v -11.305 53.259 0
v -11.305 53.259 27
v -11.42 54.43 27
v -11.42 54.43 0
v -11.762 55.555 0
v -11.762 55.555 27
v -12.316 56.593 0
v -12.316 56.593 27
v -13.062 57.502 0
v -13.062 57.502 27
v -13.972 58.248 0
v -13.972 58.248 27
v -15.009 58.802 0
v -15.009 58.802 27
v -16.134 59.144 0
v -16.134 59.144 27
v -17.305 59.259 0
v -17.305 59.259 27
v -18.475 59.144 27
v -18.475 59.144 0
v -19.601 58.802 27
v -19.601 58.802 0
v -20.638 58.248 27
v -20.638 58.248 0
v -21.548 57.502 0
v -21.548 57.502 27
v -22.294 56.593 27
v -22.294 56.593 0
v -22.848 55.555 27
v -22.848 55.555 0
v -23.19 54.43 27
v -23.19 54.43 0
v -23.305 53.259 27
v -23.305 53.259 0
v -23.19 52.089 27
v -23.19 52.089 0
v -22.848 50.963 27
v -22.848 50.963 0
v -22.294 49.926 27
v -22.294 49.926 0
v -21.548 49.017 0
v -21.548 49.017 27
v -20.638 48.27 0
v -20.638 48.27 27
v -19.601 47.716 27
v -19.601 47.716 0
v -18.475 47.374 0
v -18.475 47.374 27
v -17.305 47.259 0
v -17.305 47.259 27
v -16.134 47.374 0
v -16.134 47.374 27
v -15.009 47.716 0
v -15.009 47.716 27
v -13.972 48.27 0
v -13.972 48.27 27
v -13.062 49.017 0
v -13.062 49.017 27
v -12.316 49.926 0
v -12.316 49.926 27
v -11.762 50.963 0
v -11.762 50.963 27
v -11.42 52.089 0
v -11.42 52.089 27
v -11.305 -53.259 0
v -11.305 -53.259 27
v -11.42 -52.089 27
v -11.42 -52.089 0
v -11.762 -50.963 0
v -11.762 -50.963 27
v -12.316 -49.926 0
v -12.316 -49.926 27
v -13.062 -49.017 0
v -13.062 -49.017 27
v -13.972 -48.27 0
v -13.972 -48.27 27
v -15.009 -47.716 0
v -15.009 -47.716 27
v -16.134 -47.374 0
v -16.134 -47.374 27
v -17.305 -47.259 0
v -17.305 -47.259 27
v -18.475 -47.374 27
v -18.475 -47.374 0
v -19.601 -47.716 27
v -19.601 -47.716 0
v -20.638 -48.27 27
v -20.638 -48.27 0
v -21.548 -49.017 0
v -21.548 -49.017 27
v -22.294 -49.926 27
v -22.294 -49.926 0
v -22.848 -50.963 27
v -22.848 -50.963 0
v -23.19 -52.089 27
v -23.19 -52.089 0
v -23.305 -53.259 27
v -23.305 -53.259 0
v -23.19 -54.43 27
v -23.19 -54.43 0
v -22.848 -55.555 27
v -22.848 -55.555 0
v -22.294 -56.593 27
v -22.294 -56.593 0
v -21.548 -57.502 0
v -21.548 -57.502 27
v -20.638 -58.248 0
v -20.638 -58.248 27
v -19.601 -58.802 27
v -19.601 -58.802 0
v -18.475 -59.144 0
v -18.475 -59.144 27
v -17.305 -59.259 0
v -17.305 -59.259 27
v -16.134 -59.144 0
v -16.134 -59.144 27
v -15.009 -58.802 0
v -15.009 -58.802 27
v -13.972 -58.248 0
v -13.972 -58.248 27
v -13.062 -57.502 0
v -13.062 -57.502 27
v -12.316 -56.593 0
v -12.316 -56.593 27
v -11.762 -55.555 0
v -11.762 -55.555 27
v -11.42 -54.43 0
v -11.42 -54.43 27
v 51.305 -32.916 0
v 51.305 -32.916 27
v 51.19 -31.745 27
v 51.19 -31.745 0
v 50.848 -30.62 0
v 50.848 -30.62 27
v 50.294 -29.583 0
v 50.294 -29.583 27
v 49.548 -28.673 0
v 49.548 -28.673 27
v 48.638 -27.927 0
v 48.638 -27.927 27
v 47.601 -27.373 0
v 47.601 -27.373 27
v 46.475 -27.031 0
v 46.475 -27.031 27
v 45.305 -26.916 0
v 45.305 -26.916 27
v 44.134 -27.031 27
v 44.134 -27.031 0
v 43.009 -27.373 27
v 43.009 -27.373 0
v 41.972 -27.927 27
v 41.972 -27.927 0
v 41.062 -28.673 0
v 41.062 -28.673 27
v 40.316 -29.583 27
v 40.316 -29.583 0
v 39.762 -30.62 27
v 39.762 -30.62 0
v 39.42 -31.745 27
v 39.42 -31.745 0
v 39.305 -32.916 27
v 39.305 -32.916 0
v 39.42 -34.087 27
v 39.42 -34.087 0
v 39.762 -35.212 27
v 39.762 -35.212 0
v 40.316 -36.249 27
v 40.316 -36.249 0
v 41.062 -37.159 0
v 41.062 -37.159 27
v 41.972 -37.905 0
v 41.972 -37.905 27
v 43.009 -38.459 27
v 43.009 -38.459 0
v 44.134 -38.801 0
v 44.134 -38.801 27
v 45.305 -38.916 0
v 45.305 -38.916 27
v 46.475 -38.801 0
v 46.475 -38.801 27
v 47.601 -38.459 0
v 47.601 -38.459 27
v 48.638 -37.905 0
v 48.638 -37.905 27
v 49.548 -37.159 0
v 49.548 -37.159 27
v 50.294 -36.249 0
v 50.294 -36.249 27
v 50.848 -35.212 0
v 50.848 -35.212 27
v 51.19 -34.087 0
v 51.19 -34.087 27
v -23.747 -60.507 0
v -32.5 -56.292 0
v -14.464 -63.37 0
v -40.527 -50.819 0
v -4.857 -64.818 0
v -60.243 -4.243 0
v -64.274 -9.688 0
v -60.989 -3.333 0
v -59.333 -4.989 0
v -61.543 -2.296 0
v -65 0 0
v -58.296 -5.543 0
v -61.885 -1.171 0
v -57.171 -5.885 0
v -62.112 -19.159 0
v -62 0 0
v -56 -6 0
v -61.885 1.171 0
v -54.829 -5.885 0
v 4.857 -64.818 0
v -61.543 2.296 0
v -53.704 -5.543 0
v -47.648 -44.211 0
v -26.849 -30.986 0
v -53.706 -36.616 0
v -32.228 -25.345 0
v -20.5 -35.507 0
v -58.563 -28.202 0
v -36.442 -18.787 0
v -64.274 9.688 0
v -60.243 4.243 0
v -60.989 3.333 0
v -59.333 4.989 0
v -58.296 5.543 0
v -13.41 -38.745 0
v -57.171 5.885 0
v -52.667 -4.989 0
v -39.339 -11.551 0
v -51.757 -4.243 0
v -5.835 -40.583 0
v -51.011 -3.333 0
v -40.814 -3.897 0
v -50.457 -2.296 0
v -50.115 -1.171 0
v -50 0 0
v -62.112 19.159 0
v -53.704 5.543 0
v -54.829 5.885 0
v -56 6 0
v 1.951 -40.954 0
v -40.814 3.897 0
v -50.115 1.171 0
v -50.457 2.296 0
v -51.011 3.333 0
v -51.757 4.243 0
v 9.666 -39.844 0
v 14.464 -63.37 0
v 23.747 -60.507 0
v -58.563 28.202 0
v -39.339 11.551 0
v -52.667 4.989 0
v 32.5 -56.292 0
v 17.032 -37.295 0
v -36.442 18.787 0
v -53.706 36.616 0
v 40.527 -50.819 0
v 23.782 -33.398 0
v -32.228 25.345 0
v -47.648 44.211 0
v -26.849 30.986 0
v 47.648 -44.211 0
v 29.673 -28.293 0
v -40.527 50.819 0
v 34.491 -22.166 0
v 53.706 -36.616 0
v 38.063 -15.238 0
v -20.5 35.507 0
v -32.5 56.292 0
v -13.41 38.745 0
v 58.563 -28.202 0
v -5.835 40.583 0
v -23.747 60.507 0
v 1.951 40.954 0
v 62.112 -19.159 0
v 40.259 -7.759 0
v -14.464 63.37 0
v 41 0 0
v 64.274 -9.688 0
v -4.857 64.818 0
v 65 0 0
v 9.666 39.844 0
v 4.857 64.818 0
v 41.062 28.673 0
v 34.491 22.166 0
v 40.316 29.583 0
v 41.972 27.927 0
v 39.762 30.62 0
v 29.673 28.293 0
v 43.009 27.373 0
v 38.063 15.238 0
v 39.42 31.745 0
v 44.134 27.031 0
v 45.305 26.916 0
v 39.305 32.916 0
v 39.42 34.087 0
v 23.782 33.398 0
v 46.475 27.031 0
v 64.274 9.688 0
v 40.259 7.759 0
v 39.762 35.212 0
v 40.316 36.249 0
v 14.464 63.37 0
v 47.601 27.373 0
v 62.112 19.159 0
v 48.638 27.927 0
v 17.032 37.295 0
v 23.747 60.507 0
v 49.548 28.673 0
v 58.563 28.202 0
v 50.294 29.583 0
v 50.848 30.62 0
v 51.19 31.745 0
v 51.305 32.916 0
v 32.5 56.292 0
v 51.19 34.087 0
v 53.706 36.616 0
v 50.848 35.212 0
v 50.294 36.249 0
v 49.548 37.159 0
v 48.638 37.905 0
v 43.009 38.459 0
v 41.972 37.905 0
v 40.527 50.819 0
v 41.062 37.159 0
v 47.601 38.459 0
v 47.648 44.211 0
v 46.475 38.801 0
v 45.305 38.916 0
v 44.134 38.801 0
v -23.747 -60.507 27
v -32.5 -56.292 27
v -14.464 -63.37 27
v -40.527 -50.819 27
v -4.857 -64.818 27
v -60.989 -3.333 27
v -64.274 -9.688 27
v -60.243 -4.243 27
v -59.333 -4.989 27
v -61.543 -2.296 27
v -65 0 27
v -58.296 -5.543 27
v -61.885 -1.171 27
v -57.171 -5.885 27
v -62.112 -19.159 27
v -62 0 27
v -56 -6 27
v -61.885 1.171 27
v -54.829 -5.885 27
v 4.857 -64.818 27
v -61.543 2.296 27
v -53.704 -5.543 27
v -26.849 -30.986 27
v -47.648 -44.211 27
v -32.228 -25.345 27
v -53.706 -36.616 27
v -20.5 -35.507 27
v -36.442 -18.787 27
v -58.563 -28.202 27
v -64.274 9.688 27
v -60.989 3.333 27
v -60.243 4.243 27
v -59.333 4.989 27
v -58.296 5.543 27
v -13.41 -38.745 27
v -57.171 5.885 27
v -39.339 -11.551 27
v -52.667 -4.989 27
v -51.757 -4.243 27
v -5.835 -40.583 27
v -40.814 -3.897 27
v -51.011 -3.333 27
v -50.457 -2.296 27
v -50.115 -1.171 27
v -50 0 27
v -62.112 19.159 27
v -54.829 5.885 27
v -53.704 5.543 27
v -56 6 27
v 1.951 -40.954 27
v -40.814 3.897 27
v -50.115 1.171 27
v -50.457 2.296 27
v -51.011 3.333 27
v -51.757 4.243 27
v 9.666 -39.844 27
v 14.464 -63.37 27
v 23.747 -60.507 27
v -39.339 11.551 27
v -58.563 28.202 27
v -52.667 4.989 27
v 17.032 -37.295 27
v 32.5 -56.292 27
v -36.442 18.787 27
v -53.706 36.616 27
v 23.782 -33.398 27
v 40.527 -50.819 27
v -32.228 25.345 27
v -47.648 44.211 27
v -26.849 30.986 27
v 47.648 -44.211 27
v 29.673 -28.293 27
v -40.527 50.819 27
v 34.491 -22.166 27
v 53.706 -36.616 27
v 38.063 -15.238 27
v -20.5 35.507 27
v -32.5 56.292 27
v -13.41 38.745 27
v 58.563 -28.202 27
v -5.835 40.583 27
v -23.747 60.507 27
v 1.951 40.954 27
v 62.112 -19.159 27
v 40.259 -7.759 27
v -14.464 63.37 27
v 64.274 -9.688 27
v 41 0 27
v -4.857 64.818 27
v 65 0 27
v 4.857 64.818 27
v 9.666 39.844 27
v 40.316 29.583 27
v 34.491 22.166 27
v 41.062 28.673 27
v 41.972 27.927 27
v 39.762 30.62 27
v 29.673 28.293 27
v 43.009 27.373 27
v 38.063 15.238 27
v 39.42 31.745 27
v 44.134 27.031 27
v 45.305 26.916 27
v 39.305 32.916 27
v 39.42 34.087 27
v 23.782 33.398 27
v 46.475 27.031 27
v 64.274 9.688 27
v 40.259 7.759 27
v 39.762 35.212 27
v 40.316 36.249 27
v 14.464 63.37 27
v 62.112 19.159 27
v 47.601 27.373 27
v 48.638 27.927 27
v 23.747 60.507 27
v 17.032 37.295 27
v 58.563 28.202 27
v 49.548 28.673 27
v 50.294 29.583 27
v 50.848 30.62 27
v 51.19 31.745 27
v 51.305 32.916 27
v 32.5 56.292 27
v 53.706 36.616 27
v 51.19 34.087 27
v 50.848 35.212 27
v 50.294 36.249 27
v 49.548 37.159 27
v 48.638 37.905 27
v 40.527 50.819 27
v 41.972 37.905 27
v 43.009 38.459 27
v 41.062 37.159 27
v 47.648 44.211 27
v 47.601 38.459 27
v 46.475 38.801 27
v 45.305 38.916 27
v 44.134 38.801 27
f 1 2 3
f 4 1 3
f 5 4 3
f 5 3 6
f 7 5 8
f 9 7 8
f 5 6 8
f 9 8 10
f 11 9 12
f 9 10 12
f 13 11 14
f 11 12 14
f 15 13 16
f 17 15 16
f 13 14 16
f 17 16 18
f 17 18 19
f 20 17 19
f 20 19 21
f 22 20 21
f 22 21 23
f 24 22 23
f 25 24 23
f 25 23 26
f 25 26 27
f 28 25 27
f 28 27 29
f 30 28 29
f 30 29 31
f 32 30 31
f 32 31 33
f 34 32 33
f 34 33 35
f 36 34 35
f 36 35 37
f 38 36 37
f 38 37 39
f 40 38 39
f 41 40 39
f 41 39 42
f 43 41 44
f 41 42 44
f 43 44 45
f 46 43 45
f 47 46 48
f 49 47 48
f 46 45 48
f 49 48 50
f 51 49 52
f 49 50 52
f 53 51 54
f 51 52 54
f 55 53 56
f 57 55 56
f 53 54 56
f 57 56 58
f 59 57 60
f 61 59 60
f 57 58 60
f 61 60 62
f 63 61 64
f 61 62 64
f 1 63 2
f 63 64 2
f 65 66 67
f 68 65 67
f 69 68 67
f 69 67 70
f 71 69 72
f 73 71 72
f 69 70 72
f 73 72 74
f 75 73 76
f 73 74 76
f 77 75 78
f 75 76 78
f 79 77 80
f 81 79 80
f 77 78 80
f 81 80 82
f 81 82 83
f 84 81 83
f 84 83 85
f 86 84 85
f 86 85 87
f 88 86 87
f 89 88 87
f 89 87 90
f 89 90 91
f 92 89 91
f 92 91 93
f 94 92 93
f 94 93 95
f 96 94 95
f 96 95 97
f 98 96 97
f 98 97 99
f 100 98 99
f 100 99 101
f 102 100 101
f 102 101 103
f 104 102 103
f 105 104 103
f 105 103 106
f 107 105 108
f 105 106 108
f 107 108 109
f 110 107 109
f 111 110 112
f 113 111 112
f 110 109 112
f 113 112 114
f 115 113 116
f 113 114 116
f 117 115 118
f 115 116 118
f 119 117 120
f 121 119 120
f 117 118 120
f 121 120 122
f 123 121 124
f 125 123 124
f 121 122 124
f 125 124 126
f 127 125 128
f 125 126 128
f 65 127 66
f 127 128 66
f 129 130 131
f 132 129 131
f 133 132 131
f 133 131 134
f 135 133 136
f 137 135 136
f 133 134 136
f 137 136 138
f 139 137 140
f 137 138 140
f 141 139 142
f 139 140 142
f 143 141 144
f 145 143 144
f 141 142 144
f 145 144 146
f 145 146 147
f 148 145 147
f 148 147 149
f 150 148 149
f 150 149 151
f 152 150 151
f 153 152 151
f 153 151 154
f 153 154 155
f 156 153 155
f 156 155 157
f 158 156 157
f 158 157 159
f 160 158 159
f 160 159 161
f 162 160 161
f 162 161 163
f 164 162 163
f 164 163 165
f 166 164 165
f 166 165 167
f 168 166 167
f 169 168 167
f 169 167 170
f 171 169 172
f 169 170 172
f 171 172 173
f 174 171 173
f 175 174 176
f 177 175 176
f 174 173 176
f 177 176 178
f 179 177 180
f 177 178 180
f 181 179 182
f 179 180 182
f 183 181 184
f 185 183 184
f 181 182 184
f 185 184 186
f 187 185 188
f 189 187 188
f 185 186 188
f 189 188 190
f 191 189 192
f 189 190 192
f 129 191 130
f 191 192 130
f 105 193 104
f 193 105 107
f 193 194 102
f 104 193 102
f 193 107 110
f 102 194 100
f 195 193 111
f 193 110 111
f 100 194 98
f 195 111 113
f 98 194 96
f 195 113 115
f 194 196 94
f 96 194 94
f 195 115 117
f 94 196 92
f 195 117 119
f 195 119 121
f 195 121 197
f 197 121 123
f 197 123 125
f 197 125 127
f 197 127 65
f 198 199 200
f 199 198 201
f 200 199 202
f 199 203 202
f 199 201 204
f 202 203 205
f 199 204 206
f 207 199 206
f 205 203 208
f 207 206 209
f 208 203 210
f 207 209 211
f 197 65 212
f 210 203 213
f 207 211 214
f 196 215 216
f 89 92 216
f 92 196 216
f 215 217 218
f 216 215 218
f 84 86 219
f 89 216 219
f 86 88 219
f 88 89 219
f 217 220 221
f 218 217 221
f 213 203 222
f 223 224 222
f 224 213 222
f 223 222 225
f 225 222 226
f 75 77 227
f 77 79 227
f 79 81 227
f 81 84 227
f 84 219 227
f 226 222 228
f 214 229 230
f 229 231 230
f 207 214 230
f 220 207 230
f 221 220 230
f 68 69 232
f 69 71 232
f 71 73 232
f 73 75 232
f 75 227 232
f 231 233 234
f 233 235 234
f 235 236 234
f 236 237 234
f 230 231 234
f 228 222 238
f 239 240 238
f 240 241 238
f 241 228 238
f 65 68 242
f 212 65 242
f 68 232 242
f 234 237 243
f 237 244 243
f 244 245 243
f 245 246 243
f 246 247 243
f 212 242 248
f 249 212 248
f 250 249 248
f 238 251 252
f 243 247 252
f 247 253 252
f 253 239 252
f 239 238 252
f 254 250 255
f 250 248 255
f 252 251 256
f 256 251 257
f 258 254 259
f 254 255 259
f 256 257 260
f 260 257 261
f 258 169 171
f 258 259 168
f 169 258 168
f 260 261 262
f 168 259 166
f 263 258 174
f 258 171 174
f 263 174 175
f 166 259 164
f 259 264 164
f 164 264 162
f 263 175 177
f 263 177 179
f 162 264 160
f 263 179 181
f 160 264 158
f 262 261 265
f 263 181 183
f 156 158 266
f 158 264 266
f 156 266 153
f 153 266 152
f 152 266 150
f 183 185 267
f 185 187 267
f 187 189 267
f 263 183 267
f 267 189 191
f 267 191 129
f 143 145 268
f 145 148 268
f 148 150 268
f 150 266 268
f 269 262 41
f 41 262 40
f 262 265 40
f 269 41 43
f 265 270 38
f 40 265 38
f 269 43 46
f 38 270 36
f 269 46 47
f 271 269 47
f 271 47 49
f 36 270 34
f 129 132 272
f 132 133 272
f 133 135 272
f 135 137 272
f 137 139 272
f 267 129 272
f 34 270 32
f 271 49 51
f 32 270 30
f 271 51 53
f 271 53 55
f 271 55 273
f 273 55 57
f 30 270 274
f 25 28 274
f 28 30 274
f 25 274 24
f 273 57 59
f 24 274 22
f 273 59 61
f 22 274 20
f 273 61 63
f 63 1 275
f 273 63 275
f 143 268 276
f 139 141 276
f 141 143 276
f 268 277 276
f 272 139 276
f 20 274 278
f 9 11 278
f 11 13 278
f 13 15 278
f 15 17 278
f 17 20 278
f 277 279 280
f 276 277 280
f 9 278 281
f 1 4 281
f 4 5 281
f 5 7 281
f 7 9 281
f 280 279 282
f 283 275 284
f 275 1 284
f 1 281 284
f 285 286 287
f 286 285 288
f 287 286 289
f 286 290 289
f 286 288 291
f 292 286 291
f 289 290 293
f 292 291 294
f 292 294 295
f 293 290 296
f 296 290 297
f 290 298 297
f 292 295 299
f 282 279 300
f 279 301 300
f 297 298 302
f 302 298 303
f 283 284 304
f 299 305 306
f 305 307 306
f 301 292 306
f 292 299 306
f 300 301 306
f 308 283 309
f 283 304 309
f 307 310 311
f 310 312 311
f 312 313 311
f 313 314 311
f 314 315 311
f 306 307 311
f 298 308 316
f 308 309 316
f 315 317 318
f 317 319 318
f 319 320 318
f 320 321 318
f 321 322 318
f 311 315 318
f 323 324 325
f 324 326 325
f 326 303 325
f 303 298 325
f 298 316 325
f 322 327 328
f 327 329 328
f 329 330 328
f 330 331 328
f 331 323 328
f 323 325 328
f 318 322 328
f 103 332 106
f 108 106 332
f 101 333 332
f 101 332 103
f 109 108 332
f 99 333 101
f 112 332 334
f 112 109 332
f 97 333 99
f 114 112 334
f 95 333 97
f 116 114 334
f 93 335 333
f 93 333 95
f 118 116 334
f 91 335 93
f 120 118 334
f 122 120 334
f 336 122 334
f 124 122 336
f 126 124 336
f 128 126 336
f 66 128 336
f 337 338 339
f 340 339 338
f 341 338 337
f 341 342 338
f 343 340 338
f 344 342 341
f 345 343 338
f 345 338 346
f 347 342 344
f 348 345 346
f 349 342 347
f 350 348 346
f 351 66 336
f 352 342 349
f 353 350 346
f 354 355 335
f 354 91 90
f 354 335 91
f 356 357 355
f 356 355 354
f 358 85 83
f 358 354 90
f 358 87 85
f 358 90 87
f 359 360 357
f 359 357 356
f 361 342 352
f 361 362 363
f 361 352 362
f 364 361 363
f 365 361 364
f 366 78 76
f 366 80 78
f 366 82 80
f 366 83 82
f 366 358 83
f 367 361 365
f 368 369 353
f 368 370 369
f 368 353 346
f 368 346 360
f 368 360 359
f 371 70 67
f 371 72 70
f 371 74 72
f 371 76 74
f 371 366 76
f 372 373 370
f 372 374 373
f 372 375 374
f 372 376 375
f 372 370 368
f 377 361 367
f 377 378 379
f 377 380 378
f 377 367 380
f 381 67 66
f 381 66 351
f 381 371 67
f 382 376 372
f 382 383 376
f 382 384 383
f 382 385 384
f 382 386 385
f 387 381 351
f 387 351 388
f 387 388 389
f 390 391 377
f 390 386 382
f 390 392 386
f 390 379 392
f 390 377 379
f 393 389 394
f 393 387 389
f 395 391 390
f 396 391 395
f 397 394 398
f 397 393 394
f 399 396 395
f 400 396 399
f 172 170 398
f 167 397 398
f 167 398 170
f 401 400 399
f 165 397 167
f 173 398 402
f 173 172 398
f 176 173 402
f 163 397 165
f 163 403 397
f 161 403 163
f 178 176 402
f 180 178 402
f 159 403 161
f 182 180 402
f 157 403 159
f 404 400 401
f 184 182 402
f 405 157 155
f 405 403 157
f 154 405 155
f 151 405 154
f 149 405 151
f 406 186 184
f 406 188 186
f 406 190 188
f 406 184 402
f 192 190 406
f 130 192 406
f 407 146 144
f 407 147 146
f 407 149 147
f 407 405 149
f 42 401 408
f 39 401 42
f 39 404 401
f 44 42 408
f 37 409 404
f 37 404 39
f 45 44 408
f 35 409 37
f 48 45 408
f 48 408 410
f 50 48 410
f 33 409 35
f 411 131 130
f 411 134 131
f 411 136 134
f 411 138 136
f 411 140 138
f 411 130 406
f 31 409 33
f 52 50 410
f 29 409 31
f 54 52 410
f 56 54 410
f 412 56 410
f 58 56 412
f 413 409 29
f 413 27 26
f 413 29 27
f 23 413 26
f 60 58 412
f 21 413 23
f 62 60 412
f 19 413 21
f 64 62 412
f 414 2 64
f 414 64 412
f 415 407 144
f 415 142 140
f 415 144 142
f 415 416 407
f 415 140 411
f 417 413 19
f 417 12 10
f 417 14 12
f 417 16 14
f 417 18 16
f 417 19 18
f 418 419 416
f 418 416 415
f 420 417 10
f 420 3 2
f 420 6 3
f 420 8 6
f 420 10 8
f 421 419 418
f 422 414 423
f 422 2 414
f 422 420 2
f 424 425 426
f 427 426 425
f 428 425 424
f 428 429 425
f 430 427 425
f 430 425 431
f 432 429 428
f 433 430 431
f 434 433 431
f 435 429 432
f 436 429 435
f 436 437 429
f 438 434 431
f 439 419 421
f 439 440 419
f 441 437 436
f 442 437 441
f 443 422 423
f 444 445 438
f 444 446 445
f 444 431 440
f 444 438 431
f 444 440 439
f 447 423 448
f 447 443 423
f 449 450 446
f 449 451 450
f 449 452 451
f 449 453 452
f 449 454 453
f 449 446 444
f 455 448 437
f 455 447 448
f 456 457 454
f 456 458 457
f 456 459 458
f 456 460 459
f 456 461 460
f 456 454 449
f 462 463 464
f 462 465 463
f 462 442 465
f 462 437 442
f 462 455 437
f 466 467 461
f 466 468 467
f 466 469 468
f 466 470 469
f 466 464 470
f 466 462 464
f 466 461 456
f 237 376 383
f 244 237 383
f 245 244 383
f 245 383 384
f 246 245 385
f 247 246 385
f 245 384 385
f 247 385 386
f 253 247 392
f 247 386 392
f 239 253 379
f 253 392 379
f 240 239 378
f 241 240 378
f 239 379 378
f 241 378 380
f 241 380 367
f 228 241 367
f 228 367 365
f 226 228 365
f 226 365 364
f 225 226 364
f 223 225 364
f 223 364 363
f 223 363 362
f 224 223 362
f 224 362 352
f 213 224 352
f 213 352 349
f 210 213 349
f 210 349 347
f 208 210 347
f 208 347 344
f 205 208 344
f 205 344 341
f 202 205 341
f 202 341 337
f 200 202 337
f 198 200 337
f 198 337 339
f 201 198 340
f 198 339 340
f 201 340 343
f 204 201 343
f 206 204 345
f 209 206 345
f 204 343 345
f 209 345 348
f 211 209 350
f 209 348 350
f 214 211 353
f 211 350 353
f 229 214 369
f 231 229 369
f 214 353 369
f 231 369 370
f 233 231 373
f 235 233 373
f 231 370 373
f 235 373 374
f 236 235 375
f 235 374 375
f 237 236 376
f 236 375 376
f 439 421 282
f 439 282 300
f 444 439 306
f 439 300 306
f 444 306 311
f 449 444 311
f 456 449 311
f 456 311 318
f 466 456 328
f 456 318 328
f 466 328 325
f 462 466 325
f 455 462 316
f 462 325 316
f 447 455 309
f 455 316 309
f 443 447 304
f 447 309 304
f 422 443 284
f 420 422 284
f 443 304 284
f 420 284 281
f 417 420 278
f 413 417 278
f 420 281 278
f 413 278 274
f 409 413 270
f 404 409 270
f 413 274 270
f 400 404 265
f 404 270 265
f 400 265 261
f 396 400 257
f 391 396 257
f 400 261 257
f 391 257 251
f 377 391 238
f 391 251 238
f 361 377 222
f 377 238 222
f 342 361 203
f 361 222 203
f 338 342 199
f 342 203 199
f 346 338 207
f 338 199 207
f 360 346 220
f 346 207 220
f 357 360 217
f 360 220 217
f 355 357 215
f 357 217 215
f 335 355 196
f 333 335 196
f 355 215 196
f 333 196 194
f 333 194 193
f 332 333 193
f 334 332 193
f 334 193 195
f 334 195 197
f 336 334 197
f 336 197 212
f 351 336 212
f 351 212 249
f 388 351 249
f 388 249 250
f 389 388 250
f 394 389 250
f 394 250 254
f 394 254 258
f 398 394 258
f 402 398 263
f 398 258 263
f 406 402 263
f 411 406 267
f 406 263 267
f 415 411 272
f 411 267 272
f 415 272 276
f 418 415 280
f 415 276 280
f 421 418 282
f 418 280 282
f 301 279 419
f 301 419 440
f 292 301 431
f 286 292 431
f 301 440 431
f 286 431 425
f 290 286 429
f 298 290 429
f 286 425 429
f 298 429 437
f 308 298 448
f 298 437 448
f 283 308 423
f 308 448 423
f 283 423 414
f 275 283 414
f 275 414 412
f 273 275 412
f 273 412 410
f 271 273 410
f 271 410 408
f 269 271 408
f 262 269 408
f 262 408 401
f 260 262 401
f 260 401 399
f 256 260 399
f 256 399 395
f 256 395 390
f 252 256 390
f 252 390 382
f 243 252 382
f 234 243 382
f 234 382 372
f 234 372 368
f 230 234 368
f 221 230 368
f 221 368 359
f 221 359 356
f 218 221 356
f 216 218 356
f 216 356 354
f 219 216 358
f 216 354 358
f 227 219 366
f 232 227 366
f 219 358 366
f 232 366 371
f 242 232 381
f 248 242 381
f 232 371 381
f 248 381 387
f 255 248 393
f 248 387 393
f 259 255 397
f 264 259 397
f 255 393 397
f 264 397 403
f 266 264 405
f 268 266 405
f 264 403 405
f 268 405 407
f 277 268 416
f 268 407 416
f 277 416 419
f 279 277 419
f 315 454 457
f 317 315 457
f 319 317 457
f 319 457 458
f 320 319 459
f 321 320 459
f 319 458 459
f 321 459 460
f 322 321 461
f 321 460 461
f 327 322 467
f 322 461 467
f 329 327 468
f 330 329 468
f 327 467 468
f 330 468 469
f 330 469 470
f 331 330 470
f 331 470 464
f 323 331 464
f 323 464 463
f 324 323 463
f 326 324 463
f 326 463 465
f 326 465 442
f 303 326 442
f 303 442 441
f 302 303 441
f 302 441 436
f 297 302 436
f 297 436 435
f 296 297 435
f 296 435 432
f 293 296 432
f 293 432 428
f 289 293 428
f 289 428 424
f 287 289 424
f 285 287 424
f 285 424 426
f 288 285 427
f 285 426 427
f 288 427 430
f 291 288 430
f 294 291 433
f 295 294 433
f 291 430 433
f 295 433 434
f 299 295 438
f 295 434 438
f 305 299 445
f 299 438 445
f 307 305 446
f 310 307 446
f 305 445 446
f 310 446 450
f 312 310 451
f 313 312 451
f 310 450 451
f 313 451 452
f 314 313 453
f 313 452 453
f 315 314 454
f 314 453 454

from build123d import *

# Parameters (mm, degrees)
SZKIC1_R                    = 65
DODANIE_WYCI_GNI_CIE1_DEPTH = 27
SZKIC2_R                    = 6
SZKIC2_R_2                  = 41
WYTNIJ_WYCI_GNI_CIE1_DEPTH  = 35


with BuildPart() as part:
    # Szkic1 → Dodanie-wyciągnięcie1 (new body)
    with BuildSketch(Plane.XY):
        Circle(SZKIC1_R)
    extrude(amount=DODANIE_WYCI_GNI_CIE1_DEPTH)

    # Szkic2 → Wytnij-wyciągnięcie1 (cut)
    with BuildSketch(Plane.XY.offset(27)):
        with Locations((-56, 0)):
            Circle(SZKIC2_R)
        with Locations((-17.304951685, 53.259164913)):
            Circle(SZKIC2_R)
        with Locations((45.304951685, 32.915974128)):
            Circle(SZKIC2_R)
        with Locations((45.304951685, -32.915974128)):
            Circle(SZKIC2_R)
        with Locations((-17.304951685, -53.259164913)):
            Circle(SZKIC2_R)
        Circle(SZKIC2_R_2)
    extrude(amount=-WYTNIJ_WYCI_GNI_CIE1_DEPTH, mode=Mode.SUBTRACT)


solid = part.part
